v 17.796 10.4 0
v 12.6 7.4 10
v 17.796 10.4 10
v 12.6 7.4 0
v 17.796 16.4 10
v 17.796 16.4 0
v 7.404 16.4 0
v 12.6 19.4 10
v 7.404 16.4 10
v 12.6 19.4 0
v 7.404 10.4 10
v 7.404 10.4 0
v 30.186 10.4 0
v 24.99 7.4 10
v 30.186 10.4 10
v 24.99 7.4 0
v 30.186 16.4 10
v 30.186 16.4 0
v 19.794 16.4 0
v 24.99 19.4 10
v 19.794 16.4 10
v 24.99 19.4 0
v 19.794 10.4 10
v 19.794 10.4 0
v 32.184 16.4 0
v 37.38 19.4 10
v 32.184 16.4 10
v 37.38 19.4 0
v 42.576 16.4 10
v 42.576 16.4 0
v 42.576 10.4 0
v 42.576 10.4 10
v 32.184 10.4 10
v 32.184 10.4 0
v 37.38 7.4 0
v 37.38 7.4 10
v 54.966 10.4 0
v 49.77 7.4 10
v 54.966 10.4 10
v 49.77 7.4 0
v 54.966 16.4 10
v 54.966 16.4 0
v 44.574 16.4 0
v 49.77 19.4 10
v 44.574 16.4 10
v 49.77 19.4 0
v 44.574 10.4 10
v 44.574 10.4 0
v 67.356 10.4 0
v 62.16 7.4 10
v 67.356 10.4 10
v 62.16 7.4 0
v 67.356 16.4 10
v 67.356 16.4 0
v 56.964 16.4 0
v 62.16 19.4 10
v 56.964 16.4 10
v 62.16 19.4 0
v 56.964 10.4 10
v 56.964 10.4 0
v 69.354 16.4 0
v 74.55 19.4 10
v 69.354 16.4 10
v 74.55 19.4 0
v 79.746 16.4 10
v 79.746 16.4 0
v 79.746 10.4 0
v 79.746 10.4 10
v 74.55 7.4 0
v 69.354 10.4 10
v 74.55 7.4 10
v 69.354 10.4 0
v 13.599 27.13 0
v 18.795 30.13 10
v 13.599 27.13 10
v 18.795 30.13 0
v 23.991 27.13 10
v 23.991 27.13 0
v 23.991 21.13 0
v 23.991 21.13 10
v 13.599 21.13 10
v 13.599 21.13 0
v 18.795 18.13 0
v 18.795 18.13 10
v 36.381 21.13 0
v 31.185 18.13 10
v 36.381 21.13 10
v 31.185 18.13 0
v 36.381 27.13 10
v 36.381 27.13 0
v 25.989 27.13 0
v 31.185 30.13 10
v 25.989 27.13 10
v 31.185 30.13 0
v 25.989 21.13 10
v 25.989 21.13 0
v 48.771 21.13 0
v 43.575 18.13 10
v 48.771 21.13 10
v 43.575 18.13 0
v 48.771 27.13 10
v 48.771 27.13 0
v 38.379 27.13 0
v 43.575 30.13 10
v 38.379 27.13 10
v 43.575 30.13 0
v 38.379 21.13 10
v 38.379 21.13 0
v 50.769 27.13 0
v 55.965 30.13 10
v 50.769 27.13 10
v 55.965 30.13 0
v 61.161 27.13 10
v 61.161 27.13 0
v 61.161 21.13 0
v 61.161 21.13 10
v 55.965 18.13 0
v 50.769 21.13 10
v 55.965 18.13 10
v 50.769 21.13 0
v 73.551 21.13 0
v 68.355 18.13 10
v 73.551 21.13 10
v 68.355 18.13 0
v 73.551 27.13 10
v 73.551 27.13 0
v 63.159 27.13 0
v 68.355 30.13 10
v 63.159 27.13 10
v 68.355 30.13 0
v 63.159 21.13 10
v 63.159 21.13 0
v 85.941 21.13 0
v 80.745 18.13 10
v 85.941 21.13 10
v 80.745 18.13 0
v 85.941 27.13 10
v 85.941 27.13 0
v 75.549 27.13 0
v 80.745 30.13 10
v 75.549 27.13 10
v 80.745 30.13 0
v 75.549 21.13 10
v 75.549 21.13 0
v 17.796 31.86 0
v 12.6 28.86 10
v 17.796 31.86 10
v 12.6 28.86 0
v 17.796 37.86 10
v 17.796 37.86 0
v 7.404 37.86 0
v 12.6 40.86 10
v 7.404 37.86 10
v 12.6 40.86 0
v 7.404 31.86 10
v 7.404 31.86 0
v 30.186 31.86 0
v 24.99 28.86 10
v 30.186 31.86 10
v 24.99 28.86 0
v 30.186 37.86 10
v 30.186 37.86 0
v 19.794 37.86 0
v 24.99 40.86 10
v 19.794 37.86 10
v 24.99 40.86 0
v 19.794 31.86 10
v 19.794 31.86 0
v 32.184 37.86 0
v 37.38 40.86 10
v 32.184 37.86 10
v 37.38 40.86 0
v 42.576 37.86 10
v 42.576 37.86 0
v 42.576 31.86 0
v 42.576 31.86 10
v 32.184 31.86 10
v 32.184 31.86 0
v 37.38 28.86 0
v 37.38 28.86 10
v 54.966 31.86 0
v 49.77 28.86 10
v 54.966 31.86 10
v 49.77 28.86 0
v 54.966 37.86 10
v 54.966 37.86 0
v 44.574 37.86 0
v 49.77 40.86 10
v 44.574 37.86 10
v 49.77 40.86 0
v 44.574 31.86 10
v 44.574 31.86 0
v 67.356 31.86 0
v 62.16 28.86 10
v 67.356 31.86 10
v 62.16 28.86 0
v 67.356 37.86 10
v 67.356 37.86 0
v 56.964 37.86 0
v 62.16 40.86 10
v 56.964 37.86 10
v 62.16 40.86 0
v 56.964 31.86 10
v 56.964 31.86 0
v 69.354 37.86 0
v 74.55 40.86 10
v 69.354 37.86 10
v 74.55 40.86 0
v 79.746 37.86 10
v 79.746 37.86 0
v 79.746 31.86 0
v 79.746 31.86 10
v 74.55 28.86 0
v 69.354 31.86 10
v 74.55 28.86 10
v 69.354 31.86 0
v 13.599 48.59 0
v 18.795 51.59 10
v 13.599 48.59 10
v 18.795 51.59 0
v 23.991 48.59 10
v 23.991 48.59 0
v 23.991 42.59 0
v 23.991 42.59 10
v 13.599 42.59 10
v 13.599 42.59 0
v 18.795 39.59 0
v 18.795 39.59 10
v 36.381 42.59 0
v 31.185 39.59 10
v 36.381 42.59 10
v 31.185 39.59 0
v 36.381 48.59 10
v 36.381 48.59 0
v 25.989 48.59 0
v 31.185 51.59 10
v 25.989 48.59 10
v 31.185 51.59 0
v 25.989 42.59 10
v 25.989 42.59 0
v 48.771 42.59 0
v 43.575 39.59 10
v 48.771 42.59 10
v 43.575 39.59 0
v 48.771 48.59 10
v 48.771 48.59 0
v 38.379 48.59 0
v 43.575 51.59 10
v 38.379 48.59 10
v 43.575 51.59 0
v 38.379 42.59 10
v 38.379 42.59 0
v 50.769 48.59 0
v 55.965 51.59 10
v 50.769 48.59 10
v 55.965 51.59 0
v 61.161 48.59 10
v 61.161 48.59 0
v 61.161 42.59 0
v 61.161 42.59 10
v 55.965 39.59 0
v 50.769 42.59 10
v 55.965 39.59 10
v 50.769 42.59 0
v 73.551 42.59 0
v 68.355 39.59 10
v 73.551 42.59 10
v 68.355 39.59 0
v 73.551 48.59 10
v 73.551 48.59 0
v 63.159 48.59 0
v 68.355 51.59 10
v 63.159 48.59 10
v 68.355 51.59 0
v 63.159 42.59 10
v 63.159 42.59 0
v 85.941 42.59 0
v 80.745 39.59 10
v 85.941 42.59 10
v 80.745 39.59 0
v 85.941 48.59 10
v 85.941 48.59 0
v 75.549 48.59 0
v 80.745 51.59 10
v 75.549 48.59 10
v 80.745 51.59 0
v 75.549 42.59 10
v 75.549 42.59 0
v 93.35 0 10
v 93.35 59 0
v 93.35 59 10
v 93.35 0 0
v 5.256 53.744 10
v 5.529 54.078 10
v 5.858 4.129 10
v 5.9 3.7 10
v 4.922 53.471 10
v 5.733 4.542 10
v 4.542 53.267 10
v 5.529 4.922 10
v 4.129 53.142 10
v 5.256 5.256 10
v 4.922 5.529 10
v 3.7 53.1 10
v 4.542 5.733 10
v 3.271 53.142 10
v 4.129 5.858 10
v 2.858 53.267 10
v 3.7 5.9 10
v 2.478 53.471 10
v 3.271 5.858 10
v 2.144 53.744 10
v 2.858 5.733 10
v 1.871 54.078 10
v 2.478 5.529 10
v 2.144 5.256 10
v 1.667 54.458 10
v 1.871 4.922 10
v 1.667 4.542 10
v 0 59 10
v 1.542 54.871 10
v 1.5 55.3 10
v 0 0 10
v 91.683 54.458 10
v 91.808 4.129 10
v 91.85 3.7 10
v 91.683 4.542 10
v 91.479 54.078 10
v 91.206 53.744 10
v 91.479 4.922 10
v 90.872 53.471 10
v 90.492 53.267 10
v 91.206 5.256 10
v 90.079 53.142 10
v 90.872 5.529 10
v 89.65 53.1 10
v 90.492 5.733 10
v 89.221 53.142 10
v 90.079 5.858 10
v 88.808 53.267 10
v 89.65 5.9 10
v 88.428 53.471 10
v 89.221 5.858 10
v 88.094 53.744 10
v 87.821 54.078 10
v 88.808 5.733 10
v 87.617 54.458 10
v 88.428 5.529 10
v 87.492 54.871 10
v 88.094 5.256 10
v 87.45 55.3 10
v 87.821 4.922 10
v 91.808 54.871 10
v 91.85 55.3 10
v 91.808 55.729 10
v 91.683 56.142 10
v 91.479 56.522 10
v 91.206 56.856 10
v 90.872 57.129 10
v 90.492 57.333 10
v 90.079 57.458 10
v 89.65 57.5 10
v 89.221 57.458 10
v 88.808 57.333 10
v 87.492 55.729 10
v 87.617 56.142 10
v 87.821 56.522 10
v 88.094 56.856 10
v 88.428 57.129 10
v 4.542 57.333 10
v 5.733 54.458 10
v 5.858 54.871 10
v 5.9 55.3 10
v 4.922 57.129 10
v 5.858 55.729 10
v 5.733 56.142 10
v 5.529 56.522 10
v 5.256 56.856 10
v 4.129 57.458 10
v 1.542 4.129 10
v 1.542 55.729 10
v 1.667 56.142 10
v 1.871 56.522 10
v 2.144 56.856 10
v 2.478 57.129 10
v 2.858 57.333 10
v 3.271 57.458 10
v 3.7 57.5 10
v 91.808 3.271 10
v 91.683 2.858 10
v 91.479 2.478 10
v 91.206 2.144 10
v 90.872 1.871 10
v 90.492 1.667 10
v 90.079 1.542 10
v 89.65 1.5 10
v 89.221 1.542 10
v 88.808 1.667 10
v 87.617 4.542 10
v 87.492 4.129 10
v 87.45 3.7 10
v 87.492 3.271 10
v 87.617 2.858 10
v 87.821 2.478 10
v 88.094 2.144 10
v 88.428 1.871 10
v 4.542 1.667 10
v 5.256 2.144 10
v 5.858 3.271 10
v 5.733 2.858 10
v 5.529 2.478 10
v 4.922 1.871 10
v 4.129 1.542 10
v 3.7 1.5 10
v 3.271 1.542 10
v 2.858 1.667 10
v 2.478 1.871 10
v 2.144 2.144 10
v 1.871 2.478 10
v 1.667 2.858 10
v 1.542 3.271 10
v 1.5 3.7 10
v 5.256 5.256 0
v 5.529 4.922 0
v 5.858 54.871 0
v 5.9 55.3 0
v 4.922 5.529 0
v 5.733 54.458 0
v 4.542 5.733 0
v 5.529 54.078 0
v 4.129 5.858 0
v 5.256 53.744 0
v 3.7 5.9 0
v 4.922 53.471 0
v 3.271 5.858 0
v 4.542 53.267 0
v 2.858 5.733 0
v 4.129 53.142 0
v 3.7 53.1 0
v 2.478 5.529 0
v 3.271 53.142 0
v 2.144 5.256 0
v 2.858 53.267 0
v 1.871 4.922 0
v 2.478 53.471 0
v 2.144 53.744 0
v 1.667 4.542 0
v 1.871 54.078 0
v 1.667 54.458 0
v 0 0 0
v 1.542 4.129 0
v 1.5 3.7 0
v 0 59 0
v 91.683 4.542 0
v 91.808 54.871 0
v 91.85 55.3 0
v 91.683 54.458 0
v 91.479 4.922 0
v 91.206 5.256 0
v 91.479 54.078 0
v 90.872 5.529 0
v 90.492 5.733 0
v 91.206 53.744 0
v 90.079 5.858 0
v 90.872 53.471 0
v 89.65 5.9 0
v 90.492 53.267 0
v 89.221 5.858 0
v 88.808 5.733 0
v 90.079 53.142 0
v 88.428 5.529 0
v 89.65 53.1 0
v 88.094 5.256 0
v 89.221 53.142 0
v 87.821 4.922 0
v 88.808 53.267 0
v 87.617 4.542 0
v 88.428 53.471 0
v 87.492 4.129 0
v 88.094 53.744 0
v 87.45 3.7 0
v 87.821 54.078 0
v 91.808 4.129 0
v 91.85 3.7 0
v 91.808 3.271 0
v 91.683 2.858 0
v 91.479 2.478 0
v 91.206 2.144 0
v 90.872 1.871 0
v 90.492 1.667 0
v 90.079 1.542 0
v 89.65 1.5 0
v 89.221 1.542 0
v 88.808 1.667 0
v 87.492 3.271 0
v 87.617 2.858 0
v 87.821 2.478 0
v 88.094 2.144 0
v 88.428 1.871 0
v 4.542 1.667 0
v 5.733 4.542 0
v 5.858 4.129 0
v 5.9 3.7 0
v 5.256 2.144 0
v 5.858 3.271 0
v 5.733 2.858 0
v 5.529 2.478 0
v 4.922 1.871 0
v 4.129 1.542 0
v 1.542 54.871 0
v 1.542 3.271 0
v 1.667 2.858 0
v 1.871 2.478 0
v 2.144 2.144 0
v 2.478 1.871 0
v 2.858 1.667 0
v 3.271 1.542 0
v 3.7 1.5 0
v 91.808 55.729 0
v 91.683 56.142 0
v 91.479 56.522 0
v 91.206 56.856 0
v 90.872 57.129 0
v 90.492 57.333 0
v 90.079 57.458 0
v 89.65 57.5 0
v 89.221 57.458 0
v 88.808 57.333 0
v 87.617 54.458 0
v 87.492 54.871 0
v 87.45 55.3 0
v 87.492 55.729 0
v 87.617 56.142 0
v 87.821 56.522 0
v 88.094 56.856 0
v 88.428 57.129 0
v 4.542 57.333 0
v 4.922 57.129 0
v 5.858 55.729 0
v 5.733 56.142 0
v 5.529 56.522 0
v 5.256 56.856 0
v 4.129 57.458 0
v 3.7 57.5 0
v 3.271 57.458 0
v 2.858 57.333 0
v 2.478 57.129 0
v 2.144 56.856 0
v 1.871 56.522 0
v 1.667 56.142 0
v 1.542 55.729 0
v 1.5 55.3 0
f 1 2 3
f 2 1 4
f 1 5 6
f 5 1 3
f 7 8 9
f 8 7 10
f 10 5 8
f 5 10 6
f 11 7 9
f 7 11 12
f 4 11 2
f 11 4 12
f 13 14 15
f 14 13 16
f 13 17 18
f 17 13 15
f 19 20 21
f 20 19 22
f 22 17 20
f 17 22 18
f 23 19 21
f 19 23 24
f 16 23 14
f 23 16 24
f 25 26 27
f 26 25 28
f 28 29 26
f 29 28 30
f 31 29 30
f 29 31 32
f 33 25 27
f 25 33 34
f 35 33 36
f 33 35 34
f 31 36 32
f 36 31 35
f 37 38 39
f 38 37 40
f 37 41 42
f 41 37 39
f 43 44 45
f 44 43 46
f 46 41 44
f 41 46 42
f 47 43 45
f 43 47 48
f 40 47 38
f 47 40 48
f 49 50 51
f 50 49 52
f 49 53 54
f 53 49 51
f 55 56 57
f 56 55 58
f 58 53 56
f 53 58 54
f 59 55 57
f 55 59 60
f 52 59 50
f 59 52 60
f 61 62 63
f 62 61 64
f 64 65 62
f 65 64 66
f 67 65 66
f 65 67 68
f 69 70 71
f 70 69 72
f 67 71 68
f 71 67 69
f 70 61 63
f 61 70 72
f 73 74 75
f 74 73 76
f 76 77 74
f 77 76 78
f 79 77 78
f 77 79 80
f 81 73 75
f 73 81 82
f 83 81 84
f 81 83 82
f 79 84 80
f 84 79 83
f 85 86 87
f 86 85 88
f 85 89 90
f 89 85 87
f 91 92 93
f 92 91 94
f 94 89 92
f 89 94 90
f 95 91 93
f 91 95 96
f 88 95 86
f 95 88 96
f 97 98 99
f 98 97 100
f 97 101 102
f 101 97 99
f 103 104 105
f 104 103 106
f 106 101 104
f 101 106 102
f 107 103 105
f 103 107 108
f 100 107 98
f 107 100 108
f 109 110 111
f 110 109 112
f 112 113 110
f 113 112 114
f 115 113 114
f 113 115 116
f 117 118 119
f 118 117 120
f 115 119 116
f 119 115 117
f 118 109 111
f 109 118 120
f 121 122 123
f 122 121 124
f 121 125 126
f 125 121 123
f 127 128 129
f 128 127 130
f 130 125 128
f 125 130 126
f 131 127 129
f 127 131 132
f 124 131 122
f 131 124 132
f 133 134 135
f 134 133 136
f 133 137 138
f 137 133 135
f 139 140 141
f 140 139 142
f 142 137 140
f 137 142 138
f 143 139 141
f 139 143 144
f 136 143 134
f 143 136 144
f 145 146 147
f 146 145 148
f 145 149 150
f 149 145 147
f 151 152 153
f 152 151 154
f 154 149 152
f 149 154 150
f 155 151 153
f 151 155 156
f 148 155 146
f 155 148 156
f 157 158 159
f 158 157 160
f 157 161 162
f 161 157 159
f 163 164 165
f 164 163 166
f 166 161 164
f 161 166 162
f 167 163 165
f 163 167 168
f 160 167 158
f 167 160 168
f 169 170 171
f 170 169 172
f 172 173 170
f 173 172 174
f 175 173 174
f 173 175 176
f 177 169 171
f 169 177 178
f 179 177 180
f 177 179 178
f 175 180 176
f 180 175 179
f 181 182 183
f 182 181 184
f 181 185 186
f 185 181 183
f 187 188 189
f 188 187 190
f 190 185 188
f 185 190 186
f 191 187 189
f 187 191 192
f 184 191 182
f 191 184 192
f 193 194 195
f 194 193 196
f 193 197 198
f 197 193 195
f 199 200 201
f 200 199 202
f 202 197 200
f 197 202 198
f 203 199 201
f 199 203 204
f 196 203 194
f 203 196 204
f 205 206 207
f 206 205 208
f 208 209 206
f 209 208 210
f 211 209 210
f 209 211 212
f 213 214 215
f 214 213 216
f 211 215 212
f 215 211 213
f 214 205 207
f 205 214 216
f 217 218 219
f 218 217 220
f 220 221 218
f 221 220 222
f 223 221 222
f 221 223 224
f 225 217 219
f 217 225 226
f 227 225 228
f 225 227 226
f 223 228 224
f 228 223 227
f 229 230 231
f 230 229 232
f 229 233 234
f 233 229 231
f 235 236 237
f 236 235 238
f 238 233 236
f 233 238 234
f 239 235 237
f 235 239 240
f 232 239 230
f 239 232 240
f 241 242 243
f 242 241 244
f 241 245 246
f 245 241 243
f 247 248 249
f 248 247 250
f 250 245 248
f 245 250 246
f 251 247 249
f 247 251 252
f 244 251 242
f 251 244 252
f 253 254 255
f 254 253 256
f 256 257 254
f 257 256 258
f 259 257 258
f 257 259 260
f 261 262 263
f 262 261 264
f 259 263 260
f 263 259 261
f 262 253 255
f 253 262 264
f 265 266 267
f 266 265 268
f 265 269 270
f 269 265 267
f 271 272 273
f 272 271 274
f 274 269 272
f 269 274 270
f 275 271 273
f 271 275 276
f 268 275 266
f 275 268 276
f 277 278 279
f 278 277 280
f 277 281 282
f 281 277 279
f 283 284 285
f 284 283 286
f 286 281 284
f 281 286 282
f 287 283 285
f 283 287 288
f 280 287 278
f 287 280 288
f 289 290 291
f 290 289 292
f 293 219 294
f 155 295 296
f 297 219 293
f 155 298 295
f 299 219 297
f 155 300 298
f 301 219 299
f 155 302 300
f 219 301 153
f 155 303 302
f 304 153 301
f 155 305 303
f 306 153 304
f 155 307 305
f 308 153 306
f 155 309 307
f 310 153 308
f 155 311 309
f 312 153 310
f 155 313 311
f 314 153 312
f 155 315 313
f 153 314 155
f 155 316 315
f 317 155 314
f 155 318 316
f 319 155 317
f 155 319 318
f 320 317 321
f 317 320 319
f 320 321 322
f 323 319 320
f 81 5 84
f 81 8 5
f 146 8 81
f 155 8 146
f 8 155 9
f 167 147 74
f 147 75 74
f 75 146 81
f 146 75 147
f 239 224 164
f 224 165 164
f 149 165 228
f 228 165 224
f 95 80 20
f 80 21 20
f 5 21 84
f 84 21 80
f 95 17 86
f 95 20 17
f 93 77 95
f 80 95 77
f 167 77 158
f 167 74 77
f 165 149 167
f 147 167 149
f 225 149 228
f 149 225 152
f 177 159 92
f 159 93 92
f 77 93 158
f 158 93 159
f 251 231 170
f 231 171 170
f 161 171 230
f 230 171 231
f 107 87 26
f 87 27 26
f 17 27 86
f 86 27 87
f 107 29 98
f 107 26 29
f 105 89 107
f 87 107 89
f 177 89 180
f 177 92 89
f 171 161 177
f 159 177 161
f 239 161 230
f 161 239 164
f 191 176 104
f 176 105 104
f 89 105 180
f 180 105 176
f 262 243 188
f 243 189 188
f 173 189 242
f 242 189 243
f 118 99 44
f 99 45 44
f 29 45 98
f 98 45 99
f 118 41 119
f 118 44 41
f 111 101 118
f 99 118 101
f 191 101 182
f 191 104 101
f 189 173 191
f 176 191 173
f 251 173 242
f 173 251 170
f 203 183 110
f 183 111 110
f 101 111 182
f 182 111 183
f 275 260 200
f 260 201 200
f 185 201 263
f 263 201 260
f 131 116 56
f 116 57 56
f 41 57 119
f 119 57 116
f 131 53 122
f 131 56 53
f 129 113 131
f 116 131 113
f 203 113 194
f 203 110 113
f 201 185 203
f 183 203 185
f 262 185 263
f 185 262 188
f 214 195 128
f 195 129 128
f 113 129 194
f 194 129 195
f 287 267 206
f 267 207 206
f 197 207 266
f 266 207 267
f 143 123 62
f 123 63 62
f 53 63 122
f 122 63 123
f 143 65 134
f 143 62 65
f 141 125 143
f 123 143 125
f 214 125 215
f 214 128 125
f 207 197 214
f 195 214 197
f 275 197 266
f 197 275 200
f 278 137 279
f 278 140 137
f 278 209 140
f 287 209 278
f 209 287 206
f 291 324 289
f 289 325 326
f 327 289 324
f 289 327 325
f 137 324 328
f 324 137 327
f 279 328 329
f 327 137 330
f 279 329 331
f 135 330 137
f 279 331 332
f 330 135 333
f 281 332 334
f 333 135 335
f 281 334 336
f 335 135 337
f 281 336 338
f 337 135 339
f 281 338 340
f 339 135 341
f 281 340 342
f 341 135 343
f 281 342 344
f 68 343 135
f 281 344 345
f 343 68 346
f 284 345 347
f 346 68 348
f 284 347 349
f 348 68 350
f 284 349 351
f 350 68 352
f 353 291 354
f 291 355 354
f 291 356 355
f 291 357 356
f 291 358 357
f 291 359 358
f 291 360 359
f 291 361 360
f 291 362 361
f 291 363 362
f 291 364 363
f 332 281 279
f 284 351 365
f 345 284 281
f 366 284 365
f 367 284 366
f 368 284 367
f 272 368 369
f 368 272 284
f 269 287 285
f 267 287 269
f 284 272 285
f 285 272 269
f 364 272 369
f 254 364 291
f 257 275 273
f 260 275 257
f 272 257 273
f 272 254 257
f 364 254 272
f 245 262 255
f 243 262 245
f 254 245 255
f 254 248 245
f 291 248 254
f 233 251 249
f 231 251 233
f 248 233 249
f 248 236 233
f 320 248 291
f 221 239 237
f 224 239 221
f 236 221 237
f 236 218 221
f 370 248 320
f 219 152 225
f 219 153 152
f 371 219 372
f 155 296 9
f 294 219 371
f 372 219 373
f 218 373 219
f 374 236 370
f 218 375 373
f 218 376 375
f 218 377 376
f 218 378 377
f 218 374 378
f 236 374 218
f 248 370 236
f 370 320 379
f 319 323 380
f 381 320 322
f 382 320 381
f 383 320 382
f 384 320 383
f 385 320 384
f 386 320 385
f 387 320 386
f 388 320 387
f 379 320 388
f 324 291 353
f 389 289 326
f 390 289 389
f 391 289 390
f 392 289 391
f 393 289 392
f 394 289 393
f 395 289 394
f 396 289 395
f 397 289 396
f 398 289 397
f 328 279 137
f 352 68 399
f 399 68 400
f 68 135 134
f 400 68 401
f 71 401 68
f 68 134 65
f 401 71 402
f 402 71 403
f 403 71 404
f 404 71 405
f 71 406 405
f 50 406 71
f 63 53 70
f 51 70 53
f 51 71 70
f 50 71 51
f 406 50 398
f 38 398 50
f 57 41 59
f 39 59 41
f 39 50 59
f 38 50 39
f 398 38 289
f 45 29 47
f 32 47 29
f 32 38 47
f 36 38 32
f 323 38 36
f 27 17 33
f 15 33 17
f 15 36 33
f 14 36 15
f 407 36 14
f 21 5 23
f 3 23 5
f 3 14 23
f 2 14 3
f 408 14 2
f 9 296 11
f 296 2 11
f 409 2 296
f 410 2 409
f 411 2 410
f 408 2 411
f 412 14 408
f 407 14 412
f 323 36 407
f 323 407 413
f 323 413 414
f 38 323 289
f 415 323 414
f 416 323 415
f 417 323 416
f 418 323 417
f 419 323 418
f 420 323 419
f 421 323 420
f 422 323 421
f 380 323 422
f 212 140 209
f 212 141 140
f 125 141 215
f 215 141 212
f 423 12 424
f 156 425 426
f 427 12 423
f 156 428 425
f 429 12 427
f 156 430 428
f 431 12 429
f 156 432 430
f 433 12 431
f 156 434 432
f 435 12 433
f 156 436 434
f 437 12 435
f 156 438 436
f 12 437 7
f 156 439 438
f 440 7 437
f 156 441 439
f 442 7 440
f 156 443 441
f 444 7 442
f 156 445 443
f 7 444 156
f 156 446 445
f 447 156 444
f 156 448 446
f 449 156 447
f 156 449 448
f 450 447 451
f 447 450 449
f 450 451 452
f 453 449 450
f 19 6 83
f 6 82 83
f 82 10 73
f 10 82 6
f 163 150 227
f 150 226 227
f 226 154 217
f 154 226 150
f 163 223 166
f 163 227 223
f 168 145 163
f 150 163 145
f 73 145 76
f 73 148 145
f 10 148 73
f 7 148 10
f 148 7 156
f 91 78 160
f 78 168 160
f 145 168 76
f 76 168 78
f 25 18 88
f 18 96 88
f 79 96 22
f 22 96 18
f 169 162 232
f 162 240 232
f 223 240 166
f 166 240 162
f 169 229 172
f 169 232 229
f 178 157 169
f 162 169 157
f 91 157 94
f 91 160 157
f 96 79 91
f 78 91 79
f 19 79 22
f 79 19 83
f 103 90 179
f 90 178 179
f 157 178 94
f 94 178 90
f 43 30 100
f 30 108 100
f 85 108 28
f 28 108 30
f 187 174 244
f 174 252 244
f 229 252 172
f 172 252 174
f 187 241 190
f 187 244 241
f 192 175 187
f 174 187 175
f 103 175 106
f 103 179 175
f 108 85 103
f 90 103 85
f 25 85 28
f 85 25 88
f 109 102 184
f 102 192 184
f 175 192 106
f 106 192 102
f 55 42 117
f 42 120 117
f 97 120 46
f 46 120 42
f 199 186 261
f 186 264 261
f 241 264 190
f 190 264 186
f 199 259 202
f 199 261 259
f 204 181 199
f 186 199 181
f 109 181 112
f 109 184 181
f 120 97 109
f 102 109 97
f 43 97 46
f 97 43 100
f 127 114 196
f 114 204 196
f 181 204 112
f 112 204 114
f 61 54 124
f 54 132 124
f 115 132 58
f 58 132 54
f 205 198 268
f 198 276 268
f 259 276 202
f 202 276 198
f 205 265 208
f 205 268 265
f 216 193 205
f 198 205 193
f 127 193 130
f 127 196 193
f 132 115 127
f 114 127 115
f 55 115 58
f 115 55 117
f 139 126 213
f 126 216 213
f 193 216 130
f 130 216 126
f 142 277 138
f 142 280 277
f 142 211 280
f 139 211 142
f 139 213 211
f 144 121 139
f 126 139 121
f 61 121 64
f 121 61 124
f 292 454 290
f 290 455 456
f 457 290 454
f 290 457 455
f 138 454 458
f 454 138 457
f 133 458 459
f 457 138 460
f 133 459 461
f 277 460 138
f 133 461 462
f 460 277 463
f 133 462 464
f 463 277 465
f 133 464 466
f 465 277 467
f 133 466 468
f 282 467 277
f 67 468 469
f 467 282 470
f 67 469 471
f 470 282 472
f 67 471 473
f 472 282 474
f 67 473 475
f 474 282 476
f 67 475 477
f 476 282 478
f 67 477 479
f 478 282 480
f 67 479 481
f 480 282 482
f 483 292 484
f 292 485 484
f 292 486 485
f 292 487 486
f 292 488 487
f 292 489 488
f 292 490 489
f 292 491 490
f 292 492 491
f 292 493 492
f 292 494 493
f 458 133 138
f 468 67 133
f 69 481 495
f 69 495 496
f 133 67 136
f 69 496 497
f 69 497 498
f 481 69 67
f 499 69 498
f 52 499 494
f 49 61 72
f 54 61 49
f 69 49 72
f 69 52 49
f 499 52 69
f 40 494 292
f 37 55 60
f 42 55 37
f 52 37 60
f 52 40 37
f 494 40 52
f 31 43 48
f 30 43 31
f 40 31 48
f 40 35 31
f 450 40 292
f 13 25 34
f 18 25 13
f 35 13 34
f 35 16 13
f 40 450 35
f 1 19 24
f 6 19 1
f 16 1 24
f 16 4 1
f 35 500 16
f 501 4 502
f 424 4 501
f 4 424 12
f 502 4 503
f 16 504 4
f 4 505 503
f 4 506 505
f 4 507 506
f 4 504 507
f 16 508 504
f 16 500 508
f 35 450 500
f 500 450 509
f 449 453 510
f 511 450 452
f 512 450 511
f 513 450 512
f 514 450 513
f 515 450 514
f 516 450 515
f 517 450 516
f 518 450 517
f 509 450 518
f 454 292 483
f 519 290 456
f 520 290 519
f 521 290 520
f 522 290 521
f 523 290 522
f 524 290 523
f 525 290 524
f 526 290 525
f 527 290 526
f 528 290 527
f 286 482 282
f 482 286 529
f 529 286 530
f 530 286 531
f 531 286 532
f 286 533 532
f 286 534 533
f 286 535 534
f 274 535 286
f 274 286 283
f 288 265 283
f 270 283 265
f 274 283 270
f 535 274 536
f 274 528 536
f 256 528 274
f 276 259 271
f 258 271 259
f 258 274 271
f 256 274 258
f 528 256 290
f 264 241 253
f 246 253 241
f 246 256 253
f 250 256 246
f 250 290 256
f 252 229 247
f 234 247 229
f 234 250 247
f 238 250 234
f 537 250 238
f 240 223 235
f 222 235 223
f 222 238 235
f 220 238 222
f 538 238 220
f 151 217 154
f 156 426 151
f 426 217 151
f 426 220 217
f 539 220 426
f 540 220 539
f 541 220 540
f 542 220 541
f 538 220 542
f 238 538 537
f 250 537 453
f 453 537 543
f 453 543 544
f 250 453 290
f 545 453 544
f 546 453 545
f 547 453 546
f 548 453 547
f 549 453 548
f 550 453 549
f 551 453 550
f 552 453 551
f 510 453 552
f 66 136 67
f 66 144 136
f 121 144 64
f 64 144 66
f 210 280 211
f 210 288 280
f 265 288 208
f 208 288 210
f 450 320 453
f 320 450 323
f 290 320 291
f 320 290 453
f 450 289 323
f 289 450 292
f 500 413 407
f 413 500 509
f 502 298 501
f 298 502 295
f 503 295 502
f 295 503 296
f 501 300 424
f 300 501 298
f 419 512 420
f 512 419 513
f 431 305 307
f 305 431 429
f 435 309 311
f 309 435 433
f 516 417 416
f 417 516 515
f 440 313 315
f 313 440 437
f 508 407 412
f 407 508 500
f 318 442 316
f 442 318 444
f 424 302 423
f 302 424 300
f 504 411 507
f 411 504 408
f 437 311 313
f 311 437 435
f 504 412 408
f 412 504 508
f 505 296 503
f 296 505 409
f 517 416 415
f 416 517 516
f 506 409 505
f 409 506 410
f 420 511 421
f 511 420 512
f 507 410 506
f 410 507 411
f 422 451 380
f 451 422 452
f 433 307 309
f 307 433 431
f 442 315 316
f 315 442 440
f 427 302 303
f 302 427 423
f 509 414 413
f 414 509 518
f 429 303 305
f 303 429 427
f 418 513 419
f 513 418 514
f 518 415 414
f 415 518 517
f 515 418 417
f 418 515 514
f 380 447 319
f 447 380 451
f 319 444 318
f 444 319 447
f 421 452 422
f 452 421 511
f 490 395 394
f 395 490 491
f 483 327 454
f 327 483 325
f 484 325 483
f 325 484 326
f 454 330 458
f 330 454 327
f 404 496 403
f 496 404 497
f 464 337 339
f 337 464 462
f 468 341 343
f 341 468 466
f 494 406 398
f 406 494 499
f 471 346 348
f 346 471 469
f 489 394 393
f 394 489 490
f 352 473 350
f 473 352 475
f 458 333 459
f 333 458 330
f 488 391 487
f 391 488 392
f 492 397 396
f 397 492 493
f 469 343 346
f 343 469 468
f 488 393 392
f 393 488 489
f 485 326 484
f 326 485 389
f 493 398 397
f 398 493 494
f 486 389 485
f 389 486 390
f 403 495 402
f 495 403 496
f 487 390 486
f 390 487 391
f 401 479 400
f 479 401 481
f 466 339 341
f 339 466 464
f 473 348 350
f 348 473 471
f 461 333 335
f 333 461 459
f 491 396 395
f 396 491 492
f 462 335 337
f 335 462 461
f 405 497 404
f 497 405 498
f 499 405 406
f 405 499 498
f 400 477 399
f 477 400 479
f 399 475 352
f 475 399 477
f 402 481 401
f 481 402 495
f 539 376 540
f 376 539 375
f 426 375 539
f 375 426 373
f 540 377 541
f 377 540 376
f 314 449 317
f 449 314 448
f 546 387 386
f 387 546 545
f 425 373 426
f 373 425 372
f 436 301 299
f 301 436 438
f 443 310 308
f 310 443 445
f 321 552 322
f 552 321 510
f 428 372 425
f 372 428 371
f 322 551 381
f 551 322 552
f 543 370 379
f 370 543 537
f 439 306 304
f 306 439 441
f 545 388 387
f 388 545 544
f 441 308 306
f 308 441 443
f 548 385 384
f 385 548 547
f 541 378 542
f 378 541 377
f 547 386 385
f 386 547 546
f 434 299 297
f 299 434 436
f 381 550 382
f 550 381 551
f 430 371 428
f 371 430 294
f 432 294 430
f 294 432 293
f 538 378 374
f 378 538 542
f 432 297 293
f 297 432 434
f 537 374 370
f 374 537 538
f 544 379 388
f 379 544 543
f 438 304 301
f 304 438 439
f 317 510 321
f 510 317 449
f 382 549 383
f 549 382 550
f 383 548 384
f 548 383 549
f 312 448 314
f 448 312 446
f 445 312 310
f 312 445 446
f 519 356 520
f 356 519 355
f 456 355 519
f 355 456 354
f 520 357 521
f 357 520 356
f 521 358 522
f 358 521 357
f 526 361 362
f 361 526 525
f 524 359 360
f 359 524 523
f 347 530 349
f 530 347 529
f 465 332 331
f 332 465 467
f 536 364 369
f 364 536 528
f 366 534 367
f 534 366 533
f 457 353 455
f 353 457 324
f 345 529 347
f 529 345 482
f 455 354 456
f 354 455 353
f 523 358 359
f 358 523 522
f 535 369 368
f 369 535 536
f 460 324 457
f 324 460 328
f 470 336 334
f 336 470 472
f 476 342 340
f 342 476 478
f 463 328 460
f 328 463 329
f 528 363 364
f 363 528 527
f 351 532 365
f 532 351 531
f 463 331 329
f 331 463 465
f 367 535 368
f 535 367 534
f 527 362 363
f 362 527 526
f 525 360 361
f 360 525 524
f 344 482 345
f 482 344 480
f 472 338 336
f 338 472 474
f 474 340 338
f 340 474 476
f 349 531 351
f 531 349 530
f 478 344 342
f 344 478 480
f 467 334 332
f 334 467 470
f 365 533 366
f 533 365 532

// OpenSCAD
$fn = 32;

// ----------------------------------------------------------------------
// Honeycomb panel: 93.35 x 59 mm, 24 cells of 12 mm
// ----------------------------------------------------------------------

// --- parameters (mm) ---
panel_w = 93.35;          // panel width
panel_d = 59;             // panel depth
thick = 10;               // panel thickness
cell_r = 6;               // hex cell circumradius
pitch = 12.39;            // hex cell pitch (centre to centre)
web = 2;                  // web between the cells
columns = 6;              // columns of cells
rows = 4;                 // rows of cells
cell_count = 24;          // total cells
shift_x = 12.6;           // first cell offset in x
shift_y = 13.4;           // first cell offset in y
mount_d = 4.4;            // corner mounting holes
hole_off = 3.7;           // mounting hole offset from the corners

difference() {
  union() {
    cube([panel_w, panel_d, thick]);
  }
  /* hexagonal cells, point-up, cut right through the plate */
  for (row = [0 : rows - 1]) {
    for (col = [0 : columns - 1]) {
      translate([shift_x + col * pitch + (row % 2) * pitch / 2, shift_y + row * pitch * 0.866025, -2.5]) rotate([0, 0, 30]) cylinder(h = thick + 5, d = 2 * cell_r, $fn = 6);
    }
  }
  /* corner mounting holes, clear of the outer cell web */
  translate([3.7, 3.7, -2.5]) cylinder(h = thick + 5, d = mount_d);
  translate([89.65, 3.7, -2.5]) cylinder(h = thick + 5, d = mount_d);
  translate([3.7, 55.3, -2.5]) cylinder(h = thick + 5, d = mount_d);
  translate([89.65, 55.3, -2.5]) cylinder(h = thick + 5, d = mount_d);
}
